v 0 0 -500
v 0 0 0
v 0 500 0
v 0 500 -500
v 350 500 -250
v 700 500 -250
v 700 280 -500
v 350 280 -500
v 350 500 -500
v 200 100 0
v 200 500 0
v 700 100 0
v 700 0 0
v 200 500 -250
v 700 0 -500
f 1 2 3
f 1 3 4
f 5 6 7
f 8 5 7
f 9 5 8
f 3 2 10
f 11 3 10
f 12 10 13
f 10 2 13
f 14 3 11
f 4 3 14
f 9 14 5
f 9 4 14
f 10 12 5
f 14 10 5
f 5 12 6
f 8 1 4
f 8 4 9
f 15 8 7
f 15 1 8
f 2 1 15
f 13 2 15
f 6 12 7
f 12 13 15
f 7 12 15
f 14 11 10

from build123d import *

# Parameters (mm, degrees)
SKETCH1_W               = 700
SKETCH1_H               = 500
BOSS_EXTRUDE1_DEPTH     = 500
CUT_EXTRUDE1_DEPTH      = 1
CUT_EXTRUDE1_DEPTH_BACK = 500
CUT_EXTRUDE2_DEPTH      = 1
CUT_EXTRUDE2_DEPTH_BACK = 350


with BuildPart() as part:
    # Sketch1 → Boss-Extrude1 (new body)
    with BuildSketch(Plane(origin=(0, 0, 0), x_dir=(1, 0, 0), z_dir=(0, 1, 0))):
        with Locations((350, 250)):
            Rectangle(SKETCH1_W, SKETCH1_H)
    extrude(amount=BOSS_EXTRUDE1_DEPTH)

    # Sketch3 → Cut-Extrude1 (cut, two sides)
    with BuildSketch(Plane(origin=(700, 0, 0), x_dir=(0, 0, -1), z_dir=(1, 0, 0))) as cut_extrude1_sk:
        Polygon((0, 100), (250, 500), (0, 500), align=None)
    extrude(amount=CUT_EXTRUDE1_DEPTH, mode=Mode.SUBTRACT)
    extrude(cut_extrude1_sk.sketch, amount=-CUT_EXTRUDE1_DEPTH_BACK, mode=Mode.SUBTRACT)

    # Sketch3_3 → Cut-Extrude2 (cut, two sides)
    with BuildSketch(Plane(origin=(700, 0, 0), x_dir=(0, 0, -1), z_dir=(1, 0, 0))) as cut_extrude2_sk:
        Polygon((500, 500), (250, 500), (500, 280), align=None)
    extrude(amount=CUT_EXTRUDE2_DEPTH, mode=Mode.SUBTRACT)
    extrude(cut_extrude2_sk.sketch, amount=-CUT_EXTRUDE2_DEPTH_BACK, mode=Mode.SUBTRACT)


solid = part.part
